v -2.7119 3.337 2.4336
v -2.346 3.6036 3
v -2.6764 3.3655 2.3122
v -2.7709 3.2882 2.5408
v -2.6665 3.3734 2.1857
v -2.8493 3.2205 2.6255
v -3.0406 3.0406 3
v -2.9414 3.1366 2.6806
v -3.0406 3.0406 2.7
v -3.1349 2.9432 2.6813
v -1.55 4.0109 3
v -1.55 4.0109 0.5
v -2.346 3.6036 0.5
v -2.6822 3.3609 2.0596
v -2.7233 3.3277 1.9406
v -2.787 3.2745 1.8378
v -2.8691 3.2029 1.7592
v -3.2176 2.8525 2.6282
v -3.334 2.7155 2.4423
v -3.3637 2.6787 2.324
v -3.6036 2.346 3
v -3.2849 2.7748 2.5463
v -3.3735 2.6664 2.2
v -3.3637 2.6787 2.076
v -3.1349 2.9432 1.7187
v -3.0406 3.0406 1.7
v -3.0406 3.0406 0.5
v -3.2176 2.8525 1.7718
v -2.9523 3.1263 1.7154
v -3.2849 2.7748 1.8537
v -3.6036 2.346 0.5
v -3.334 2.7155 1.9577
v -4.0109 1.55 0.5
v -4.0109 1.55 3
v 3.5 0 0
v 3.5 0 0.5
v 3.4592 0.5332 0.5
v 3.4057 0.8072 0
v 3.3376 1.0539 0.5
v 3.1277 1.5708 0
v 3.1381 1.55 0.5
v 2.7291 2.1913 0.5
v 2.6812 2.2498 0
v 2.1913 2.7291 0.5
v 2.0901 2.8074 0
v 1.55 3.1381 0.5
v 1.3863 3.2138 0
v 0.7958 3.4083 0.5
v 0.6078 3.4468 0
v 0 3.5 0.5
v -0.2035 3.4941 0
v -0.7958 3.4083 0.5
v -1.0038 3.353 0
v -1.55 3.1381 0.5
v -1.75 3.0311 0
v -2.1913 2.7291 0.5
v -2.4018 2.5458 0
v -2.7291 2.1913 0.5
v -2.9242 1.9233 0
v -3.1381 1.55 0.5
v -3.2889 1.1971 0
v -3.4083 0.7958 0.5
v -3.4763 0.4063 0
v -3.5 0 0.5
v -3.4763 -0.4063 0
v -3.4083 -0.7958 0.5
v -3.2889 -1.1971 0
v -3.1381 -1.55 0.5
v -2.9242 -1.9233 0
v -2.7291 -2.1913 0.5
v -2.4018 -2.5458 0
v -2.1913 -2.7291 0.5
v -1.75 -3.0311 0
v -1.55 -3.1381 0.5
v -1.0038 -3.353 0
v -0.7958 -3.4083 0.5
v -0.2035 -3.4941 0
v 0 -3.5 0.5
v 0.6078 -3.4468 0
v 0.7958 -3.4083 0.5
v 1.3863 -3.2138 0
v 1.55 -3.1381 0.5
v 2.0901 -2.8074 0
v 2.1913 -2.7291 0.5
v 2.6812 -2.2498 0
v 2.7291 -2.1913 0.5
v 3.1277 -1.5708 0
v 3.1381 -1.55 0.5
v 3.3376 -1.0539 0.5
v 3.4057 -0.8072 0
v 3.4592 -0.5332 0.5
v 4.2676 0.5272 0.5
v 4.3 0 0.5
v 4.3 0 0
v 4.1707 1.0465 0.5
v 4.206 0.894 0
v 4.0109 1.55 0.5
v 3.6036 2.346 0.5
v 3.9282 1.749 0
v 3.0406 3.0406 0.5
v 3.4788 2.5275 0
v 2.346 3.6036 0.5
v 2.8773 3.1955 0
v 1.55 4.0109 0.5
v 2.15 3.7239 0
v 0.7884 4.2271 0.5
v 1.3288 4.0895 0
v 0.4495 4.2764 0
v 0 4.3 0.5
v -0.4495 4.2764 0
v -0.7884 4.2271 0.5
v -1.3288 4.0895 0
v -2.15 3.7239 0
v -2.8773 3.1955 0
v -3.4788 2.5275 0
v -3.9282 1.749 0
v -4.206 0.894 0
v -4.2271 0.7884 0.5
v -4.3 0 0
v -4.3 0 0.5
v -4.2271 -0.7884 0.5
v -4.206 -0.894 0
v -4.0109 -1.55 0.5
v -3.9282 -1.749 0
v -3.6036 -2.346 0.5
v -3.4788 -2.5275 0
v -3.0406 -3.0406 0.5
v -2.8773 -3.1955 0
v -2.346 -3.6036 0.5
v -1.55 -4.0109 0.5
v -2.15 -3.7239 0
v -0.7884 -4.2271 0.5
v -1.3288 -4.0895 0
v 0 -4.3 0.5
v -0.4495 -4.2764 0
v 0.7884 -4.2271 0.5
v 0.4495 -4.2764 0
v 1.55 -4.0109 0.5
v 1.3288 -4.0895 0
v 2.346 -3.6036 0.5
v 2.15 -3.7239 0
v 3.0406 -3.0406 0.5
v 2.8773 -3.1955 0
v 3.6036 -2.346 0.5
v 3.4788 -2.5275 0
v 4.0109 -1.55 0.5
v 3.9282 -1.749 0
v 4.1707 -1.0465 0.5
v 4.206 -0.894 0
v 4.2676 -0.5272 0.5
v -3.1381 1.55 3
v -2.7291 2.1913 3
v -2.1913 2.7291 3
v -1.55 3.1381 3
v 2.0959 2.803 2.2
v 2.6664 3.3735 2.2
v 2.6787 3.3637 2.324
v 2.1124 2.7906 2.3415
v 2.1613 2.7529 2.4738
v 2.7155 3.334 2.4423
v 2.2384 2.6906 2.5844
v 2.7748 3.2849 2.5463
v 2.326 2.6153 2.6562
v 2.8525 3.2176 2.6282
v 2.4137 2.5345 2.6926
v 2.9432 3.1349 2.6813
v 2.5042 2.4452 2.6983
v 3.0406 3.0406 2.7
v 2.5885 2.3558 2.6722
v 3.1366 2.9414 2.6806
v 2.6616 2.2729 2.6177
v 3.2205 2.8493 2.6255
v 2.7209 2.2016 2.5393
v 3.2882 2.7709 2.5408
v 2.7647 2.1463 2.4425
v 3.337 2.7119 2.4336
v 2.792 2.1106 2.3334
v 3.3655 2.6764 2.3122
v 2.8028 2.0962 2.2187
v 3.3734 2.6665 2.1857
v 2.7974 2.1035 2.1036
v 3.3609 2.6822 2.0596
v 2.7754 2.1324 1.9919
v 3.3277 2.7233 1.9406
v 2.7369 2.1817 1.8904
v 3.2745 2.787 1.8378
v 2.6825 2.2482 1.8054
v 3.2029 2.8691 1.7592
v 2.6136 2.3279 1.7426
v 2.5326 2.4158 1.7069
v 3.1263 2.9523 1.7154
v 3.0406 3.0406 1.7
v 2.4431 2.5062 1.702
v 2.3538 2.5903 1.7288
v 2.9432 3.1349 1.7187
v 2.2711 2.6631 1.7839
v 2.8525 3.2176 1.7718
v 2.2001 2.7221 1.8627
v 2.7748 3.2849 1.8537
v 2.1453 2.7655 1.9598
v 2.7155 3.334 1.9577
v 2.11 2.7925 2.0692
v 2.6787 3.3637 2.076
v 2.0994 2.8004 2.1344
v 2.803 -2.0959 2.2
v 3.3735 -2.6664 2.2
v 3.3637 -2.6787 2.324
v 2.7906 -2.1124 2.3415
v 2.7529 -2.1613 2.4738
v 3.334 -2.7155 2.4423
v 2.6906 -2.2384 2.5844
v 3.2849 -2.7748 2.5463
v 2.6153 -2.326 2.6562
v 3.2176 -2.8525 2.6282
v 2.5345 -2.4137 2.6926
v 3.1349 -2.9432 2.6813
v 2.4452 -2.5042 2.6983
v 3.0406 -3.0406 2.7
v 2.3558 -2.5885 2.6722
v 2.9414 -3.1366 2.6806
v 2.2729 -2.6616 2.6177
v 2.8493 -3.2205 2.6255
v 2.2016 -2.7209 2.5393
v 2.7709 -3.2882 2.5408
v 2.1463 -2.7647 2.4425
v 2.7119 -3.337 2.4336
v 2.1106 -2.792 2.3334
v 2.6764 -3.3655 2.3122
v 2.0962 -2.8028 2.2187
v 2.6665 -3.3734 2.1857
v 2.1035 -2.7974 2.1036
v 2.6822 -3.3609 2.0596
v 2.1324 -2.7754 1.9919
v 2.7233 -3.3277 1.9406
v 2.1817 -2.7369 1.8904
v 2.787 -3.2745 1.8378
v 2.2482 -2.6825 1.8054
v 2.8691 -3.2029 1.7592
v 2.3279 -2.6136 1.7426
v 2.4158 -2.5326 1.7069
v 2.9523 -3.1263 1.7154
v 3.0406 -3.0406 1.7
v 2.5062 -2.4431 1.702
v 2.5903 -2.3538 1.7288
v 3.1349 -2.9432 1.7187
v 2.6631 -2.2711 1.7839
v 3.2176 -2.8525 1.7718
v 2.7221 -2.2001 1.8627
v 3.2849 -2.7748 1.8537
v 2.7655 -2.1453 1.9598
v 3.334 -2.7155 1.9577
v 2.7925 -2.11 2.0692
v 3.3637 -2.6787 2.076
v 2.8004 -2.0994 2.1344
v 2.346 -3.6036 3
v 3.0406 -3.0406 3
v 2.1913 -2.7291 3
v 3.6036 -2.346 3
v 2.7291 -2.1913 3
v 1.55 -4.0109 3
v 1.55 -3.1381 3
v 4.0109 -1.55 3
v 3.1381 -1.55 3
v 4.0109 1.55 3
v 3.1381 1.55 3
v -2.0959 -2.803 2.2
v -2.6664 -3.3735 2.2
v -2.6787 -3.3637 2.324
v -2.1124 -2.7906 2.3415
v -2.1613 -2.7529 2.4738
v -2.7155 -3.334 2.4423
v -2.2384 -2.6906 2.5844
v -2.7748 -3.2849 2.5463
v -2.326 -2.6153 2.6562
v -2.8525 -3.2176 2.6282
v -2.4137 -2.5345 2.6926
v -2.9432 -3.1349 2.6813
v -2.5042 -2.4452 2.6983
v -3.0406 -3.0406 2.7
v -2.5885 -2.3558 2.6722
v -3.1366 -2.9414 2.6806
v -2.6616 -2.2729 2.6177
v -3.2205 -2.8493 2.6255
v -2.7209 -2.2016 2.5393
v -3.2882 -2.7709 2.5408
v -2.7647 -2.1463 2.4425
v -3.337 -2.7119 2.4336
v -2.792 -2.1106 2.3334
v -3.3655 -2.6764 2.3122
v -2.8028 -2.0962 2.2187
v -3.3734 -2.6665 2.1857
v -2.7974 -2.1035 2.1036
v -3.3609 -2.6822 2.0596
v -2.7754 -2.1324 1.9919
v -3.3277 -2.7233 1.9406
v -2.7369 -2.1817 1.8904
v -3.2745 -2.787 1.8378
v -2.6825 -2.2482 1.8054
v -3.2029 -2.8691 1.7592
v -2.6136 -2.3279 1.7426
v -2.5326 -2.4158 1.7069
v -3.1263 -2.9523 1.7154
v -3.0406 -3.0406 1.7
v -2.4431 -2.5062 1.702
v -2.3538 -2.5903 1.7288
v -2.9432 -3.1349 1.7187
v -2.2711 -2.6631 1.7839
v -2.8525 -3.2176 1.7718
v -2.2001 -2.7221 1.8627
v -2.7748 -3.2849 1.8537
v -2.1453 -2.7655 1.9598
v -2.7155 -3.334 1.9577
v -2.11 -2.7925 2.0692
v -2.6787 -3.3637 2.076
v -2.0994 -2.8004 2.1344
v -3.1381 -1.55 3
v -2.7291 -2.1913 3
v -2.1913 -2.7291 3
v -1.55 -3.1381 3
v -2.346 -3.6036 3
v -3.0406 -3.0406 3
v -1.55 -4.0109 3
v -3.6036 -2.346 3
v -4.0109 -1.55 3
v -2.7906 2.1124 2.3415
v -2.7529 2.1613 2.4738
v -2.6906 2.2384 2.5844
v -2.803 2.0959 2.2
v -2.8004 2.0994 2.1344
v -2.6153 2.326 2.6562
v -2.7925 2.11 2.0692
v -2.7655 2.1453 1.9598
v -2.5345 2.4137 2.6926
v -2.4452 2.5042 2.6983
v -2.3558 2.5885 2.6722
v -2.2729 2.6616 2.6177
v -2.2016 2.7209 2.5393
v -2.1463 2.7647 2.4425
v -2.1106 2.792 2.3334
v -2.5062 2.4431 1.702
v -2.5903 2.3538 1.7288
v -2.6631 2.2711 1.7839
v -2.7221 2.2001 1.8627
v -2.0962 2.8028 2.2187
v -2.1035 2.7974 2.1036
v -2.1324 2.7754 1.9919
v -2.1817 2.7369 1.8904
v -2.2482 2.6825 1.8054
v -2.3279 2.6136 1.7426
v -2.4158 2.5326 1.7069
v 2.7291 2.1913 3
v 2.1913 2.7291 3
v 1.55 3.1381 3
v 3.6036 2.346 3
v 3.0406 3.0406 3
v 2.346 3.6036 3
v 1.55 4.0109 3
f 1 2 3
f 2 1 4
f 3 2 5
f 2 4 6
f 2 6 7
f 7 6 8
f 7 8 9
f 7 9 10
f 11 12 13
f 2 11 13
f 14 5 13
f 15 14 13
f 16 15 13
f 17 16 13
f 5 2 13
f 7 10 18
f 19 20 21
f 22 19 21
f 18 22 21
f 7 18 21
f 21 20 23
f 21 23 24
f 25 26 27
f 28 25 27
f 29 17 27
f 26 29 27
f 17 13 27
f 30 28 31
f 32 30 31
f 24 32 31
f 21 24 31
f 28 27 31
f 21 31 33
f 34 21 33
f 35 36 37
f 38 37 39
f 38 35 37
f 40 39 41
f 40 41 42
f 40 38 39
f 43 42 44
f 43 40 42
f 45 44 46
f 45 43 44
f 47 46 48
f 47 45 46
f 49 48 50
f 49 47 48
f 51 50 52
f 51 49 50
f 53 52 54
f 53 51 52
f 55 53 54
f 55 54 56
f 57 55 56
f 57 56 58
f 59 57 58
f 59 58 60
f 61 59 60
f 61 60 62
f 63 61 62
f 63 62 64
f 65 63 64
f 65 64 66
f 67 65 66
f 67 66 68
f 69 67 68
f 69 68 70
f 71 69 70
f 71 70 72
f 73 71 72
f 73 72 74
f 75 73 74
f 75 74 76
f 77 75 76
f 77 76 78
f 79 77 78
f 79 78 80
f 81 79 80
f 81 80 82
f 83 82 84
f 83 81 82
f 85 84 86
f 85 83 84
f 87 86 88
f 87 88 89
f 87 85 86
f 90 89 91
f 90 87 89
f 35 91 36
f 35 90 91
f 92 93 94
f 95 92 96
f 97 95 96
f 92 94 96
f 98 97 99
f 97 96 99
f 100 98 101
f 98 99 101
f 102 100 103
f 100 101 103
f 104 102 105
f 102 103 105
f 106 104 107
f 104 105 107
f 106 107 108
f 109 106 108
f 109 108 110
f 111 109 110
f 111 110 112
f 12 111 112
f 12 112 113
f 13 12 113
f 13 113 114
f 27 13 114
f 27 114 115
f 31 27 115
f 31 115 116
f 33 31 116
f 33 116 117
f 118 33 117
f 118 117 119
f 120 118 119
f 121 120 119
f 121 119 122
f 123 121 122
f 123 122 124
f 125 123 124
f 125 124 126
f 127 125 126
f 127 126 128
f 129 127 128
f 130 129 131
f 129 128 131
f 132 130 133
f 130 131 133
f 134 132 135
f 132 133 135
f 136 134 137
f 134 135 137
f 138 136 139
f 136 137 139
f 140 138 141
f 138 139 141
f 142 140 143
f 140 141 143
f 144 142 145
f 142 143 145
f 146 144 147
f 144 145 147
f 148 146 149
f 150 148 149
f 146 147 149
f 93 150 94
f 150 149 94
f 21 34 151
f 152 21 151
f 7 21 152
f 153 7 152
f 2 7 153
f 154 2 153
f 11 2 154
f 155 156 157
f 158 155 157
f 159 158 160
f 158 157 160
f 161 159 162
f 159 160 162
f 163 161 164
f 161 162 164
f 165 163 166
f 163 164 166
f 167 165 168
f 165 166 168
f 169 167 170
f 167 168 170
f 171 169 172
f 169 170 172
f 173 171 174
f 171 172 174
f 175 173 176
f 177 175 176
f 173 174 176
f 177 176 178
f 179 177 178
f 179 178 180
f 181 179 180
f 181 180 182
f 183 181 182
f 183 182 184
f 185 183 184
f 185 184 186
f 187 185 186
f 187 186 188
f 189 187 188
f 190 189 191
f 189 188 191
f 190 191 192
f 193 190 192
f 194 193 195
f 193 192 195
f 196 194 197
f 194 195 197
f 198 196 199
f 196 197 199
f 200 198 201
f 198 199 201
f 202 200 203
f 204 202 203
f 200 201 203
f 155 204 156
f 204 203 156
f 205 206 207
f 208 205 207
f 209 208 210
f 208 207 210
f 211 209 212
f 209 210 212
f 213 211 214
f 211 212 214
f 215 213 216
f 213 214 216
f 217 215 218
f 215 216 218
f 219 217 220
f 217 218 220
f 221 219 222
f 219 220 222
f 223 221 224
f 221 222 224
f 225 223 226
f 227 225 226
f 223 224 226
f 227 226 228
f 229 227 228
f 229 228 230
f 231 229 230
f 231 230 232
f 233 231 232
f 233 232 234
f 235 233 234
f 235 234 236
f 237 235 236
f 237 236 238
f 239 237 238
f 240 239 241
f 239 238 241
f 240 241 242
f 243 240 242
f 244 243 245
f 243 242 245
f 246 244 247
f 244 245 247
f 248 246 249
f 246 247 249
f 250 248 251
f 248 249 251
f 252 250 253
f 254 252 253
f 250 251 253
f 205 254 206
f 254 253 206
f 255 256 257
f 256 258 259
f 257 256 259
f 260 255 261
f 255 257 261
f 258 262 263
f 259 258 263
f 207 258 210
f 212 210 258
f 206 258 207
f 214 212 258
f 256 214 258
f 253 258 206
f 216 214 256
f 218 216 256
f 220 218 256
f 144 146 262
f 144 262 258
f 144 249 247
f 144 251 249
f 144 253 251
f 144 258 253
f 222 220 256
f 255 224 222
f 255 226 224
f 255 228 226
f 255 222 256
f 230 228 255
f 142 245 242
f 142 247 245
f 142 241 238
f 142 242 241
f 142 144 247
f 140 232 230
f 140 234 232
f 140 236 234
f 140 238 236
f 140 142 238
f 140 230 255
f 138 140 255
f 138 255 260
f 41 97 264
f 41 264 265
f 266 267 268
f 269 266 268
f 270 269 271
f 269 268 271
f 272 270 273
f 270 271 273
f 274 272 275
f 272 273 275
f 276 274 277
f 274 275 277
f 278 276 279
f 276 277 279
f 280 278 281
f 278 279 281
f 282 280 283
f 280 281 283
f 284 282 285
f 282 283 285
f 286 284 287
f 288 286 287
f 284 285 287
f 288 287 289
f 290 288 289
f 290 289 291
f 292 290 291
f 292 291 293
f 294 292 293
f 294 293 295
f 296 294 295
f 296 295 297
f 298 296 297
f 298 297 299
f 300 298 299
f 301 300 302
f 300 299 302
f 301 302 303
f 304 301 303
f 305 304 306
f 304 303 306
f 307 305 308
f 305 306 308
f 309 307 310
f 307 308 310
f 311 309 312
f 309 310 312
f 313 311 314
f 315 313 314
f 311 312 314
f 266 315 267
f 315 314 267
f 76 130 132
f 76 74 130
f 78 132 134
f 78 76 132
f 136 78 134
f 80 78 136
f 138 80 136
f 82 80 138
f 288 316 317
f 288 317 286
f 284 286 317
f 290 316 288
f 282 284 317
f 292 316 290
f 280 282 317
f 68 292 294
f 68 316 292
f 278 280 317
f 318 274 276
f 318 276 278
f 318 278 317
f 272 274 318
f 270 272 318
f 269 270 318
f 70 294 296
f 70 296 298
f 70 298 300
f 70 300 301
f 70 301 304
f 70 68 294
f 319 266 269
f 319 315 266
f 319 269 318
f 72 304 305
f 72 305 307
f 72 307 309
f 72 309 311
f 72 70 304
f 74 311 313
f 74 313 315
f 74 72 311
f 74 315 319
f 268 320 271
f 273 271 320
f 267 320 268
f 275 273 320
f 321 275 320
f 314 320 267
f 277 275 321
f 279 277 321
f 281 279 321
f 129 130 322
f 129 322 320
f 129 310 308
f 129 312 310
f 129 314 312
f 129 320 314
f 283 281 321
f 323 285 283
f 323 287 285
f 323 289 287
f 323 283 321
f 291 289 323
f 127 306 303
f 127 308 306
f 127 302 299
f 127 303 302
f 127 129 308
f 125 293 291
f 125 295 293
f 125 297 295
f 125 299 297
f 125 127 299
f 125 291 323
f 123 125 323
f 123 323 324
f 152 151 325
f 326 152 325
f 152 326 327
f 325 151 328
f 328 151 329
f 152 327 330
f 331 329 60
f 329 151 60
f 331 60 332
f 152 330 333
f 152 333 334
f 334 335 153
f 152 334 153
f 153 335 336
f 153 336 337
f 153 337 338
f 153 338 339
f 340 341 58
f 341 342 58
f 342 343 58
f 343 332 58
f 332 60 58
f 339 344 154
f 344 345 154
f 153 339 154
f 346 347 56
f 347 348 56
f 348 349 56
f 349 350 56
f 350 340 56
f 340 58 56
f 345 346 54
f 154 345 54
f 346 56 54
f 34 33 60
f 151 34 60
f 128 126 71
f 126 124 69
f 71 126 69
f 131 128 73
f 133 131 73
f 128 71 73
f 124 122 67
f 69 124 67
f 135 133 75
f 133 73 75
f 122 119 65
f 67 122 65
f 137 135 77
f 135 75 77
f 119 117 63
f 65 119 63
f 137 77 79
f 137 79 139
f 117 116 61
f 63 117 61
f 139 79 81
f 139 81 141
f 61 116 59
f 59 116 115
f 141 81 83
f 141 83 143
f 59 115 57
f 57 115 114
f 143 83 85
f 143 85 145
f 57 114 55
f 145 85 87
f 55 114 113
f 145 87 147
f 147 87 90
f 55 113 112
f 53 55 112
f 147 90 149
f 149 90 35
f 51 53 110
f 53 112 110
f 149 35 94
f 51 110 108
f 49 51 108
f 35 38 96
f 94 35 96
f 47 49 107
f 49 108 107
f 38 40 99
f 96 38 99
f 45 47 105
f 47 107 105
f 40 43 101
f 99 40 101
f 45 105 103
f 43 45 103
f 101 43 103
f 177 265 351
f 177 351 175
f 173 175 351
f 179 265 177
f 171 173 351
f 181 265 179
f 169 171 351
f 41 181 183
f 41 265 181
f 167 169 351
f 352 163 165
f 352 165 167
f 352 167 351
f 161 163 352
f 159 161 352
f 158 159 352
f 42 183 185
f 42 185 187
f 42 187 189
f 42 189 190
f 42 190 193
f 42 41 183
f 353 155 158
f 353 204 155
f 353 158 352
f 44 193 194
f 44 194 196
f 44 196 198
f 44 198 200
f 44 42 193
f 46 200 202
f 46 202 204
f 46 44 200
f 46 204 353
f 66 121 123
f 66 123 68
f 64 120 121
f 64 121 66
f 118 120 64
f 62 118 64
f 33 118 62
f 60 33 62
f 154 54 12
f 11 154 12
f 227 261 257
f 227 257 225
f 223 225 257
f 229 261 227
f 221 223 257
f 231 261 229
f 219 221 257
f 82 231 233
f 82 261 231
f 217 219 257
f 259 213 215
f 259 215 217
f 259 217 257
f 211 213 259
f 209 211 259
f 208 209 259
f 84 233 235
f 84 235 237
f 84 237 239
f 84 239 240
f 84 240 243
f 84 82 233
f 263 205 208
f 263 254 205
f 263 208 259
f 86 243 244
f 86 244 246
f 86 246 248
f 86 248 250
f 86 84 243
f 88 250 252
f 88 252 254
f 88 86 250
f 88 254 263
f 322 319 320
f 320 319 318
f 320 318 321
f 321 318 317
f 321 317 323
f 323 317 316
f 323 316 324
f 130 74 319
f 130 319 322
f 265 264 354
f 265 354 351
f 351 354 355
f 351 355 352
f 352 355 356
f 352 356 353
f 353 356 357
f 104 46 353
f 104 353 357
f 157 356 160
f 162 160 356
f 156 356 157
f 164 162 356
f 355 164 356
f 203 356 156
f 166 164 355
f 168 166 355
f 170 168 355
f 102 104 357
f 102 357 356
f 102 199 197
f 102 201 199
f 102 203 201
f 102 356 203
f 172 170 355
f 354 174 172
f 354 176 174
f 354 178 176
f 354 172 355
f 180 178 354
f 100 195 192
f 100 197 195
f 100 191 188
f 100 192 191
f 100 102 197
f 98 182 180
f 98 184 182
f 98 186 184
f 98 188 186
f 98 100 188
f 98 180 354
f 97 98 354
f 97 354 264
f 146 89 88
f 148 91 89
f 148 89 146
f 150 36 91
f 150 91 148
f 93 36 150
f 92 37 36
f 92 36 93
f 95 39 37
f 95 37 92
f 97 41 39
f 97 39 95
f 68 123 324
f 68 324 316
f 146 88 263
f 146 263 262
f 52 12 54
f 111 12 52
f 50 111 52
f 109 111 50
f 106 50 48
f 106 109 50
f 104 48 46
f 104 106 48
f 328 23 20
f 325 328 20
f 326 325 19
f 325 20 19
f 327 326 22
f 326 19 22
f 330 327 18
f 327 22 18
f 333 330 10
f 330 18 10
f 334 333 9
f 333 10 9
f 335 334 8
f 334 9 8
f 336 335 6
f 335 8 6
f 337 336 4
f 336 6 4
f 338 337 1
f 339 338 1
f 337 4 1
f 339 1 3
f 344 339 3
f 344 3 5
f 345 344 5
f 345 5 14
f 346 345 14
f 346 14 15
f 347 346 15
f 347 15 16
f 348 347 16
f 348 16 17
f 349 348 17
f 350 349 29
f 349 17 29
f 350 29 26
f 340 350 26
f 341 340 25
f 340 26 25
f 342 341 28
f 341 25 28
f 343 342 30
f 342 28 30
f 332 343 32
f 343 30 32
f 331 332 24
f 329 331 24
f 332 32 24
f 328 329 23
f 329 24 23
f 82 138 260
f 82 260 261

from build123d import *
from build123d.topology import SkipClean

# Parameters (mm, degrees)
SKETCH1_R           = 4.3
SKETCH1_R_2         = 3.5
BOSS_EXTRUDE1_DEPTH = 0.5
BOSS_EXTRUDE2_DEPTH = 2.5
SKETCH5_R           = 0.5
CUT_EXTRUDE2_DEPTH  = 3
CIRPATTERN1_COUNT   = 4


with BuildPart() as part:
    # Sketch1 → Boss-Extrude1 (new body)
    with BuildSketch(Plane.XY):
        Circle(SKETCH1_R)
        Circle(SKETCH1_R_2, mode=Mode.SUBTRACT)
    extrude(amount=BOSS_EXTRUDE1_DEPTH)

    # Sketch2 → Boss-Extrude2 (add)
    with SkipClean():  # the faces are left unmerged after this step: merging them gives an invalid solid
        with BuildSketch(Plane.XY.offset(0.5)):
            with BuildLine():
                Line((4.010922587, 1.55), (3.138072657, 1.55))
                ThreePointArc((3.138072657, 1.55), (2.474873734, 2.474873734), (1.55, 3.138072657))
                Line((1.55, 3.138072657), (1.55, 4.010922587))
                ThreePointArc((1.55, 4.010922587), (3.040559159, 3.040559159), (4.010922587, 1.55))
            make_face()
            with BuildLine():
                Line((-4.010922587, 1.55), (-3.138072657, 1.55))
                ThreePointArc((-3.138072657, 1.55), (-2.474873734, 2.474873734), (-1.55, 3.138072657))
                Line((-1.55, 3.138072657), (-1.55, 4.010922587))
                ThreePointArc((-1.55, 4.010922587), (-3.040559159, 3.040559159), (-4.010922587, 1.55))
            make_face()
            with BuildLine():
                Line((1.55, -4.010922587), (1.55, -3.138072657))
                ThreePointArc((1.55, -3.138072657), (2.474873734, -2.474873734), (3.138072657, -1.55))
                Line((3.138072657, -1.55), (4.010922587, -1.55))
                ThreePointArc((4.010922587, -1.55), (3.040559159, -3.040559159), (1.55, -4.010922587))
            make_face()
            with BuildLine():
                Line((-4.010922587, -1.55), (-3.138072657, -1.55))
                ThreePointArc((-3.138072657, -1.55), (-2.474873734, -2.474873734), (-1.55, -3.138072657))
                Line((-1.55, -3.138072657), (-1.55, -4.010922587))
                ThreePointArc((-1.55, -4.010922587), (-3.040559159, -3.040559159), (-4.010922587, -1.55))
            make_face()
        extrude(amount=BOSS_EXTRUDE2_DEPTH)

    # Sketch5 → Cut-Extrude2 (cut)
    with SkipClean():  # the faces are left unmerged after this step: merging them gives an invalid solid
        with BuildSketch(Plane(origin=(3.040559159, 3.040559159, 0), x_dir=(0, 0, -1), z_dir=(0.7071067811865499, 0.7071067811865452, 0))):
            with Locations(Location((-2.2, 0, 0), (0, 0, 90))):
                Circle(SKETCH5_R)
        cut_extrude2 = extrude(amount=-CUT_EXTRUDE2_DEPTH, mode=Mode.SUBTRACT)

    # CirPattern1: Cut-Extrude2 ×4 about axis
    with SkipClean():  # the faces are left unmerged after this step: merging them gives an invalid solid
        cirpattern1_axis = Axis((0, 0, 0.5), (0, 0, -1))
        for i in range(1, CIRPATTERN1_COUNT):
            add(cut_extrude2.rotate(cirpattern1_axis, i * 360 / CIRPATTERN1_COUNT), mode=Mode.SUBTRACT)


solid = part.part
